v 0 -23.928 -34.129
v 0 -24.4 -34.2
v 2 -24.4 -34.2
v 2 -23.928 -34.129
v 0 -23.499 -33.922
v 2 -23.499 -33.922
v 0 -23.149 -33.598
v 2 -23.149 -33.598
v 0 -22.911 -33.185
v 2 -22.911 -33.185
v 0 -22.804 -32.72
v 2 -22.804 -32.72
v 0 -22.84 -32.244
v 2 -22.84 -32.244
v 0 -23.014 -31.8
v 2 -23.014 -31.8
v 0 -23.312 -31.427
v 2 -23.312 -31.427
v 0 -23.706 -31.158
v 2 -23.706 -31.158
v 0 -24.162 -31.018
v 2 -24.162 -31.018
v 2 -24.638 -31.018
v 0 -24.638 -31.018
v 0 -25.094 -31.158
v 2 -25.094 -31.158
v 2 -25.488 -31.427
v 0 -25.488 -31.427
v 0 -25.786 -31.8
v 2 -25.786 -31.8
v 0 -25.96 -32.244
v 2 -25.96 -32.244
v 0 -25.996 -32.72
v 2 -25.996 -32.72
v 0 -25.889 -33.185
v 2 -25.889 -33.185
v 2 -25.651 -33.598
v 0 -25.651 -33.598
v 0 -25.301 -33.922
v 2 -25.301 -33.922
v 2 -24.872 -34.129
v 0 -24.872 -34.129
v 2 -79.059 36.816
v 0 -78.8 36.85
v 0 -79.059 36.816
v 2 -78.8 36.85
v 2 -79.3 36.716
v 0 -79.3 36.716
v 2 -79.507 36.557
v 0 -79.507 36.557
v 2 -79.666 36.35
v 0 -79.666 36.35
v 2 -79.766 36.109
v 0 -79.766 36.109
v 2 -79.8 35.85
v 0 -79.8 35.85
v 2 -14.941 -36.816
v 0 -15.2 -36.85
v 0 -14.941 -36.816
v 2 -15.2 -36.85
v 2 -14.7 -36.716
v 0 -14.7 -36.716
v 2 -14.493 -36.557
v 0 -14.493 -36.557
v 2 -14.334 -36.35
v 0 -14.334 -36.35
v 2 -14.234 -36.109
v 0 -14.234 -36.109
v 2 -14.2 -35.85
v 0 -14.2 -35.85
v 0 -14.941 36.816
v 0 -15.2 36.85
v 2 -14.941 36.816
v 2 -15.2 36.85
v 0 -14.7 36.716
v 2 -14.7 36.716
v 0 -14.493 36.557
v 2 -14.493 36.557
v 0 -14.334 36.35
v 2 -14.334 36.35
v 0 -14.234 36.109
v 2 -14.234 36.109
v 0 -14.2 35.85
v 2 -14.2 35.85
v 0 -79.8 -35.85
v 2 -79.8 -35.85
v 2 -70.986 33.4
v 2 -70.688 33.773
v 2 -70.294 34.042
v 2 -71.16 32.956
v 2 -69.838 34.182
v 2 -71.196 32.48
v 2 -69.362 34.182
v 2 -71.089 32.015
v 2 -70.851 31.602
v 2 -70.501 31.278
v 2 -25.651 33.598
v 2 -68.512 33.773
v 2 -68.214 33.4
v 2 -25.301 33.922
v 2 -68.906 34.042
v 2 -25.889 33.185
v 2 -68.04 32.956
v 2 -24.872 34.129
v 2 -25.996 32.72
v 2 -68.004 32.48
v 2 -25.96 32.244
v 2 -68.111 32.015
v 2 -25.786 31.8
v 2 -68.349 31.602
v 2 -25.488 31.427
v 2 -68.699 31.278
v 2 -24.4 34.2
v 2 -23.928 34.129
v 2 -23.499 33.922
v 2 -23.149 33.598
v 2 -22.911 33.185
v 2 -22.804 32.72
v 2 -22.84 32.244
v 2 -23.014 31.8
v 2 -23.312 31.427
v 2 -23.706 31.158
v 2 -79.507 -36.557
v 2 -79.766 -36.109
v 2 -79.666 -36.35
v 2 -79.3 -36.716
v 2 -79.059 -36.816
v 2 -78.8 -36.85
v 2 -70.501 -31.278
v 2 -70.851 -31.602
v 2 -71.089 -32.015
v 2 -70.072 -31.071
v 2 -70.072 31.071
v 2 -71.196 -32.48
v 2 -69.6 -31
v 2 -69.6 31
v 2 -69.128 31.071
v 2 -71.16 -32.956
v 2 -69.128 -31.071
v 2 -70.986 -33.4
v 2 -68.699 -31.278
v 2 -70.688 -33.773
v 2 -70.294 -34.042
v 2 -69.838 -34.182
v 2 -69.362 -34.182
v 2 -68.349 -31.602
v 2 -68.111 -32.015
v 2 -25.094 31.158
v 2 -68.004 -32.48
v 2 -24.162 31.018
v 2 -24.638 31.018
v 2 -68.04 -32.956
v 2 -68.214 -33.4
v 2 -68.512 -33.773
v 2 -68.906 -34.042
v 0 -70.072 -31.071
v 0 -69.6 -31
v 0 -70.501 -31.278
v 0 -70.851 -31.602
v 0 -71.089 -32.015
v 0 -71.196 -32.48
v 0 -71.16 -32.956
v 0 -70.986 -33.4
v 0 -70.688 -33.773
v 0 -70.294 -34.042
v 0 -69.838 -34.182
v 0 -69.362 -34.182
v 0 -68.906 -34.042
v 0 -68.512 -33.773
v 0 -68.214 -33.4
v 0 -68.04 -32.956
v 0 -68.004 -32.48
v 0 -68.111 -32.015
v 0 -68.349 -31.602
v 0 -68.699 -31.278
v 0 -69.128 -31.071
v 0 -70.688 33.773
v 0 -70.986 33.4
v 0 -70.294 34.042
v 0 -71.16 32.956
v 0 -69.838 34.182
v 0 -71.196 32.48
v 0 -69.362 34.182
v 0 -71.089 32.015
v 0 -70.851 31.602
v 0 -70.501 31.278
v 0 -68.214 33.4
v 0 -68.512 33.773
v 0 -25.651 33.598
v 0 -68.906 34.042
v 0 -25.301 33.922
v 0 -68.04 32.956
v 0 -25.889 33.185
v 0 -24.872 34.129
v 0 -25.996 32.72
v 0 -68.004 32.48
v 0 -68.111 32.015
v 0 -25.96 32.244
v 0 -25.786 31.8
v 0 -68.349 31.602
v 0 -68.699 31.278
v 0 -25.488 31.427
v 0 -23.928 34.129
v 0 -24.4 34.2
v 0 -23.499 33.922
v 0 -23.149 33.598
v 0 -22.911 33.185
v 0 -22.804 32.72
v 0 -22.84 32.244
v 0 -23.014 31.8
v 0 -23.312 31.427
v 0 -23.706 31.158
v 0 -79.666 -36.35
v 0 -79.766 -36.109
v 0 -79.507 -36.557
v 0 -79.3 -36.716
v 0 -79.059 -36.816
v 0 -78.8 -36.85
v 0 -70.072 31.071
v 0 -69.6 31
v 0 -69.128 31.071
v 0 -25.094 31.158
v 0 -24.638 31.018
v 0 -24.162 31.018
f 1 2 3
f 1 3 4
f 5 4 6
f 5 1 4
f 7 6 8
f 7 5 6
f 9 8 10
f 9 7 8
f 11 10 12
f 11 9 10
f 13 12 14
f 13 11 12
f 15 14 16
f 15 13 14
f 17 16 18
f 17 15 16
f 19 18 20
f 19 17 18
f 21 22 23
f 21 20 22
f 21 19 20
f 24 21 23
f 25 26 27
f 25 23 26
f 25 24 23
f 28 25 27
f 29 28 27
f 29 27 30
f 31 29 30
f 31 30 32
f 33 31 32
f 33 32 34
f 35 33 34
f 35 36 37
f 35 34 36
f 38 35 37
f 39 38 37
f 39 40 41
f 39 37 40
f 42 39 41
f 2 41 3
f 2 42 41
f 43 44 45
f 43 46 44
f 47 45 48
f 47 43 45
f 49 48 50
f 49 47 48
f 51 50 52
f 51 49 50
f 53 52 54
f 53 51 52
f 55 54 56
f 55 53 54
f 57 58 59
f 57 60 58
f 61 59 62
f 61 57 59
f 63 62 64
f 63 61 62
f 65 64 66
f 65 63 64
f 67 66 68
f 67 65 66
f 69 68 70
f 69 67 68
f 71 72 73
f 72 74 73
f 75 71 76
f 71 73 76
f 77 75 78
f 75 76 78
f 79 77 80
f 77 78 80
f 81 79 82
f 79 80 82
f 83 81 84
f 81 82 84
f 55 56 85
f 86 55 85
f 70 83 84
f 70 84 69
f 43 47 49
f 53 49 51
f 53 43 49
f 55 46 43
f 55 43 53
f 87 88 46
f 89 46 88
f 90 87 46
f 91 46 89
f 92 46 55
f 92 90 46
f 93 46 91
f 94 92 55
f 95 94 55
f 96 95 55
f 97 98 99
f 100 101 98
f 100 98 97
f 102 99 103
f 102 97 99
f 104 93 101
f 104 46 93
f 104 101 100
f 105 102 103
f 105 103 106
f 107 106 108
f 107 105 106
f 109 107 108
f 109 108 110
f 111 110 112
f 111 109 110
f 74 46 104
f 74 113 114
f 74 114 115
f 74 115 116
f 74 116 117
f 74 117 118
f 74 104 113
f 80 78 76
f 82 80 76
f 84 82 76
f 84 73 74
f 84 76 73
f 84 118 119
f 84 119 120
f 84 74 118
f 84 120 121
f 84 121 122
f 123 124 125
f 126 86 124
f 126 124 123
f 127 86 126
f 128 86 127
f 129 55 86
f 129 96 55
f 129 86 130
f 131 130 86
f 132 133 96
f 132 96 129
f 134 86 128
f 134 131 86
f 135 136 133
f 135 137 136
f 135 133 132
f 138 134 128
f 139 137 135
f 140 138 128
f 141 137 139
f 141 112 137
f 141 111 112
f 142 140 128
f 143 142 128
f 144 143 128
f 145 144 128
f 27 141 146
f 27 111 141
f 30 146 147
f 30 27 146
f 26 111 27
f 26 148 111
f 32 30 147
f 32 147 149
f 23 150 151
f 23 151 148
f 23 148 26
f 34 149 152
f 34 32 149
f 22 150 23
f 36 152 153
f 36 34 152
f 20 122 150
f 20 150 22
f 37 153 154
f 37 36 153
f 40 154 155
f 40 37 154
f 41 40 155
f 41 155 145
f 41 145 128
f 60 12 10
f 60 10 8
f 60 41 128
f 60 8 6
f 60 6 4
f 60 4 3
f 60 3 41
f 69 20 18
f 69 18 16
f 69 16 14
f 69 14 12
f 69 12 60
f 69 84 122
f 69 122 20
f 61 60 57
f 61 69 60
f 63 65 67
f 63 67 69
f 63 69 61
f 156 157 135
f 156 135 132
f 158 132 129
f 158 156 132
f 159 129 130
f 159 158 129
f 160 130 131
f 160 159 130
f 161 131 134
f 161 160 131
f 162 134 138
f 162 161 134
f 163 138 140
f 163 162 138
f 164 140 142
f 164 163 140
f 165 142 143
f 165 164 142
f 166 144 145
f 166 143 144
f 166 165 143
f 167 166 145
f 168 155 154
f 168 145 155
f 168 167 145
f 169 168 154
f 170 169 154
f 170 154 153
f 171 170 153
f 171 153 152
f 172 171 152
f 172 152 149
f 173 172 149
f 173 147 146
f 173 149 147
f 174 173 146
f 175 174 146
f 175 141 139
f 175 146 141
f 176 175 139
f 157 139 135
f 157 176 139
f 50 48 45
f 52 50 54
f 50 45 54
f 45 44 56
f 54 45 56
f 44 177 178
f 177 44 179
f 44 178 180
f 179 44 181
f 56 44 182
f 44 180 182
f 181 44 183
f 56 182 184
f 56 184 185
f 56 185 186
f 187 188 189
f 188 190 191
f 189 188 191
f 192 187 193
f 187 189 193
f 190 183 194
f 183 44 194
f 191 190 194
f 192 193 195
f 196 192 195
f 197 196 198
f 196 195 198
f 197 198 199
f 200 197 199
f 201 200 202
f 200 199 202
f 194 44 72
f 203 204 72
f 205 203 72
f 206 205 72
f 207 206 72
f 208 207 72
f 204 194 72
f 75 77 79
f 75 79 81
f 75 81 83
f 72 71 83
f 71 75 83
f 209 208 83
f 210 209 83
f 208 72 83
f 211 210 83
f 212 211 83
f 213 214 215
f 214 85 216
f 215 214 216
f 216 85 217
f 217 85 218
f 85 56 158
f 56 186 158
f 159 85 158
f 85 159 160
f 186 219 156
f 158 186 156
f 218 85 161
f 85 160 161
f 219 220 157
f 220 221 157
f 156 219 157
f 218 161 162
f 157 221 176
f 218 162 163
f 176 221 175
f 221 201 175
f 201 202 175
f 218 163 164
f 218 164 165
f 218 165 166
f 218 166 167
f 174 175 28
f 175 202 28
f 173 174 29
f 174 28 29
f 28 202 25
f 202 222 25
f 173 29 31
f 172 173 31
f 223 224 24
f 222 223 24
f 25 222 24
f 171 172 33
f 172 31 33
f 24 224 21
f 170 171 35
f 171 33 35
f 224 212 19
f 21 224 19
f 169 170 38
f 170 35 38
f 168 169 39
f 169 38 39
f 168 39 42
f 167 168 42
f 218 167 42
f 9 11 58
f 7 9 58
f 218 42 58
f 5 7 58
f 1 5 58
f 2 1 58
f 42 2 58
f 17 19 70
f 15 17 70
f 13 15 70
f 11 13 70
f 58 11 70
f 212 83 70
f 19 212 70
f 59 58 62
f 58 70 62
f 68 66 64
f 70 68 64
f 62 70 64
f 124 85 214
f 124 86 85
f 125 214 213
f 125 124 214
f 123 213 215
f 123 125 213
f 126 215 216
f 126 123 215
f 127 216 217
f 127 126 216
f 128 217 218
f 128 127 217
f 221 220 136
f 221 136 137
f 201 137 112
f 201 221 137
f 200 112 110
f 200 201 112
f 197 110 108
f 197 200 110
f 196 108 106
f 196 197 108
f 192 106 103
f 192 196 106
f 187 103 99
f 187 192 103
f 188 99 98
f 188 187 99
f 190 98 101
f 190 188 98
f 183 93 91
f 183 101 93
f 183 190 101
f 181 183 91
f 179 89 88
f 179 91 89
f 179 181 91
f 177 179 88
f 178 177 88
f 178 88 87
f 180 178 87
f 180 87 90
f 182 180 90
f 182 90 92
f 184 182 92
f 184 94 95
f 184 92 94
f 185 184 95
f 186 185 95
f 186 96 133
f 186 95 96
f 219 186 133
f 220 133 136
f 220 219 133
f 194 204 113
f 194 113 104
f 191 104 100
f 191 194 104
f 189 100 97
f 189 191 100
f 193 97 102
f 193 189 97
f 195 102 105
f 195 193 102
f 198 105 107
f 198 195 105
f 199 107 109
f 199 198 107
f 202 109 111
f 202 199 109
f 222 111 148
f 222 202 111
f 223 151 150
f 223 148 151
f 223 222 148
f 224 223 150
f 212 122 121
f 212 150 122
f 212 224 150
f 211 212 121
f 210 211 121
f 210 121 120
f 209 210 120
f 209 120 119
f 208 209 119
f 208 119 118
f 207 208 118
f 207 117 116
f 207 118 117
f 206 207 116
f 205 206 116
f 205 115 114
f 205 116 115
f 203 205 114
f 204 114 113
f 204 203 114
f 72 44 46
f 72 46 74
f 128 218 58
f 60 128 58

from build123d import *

# Parameters (mm, degrees)
SKETCH1_W               = 73.7
SKETCH1_H               = 65.6
BOSS_EXTRUDE1_DEPTH     = 2
FILLET1_R               = 1
CUT_EXTRUDE1_DEPTH      = 88.9202053
CUT_EXTRUDE1_DEPTH_BACK = 88.9202053
SKETCH2_R               = 1.6


with BuildPart() as part:
    # Sketch1 → Boss-Extrude1 (new body)
    with BuildSketch(Plane(origin=(0, 0, 0), x_dir=(0, 0, -1), z_dir=(1, 0, 0))):
        with Locations((0, -47)):
            Rectangle(SKETCH1_W, SKETCH1_H)
    extrude(amount=BOSS_EXTRUDE1_DEPTH)

    # Fillet1
    fillet1_edges = [part.edges().sort_by_distance(p)[0] for p in [
        (1, -14.2, 36.85),
        (1, -14.2, -36.85),
        (1, -79.8, -36.85),
        (1, -79.8, 36.85),
    ]]
    fillet(fillet1_edges, radius=FILLET1_R)

    # Sketch2 → Cut-Extrude1 (cut, two sides: drawn at the far end of the back side and taken through both)
    with BuildSketch(Plane(origin=(0, 0, 0), x_dir=(0, 0, -1), z_dir=(1, 0, 0)).offset(-CUT_EXTRUDE1_DEPTH_BACK)):
        with Locations((-32.6, -69.6)):
            Circle(SKETCH2_R)
        with Locations(Location((32.6, -69.6, 0), (0, 0, 180))):
            Circle(SKETCH2_R)
        with Locations((32.6, -24.4)):
            Circle(SKETCH2_R)
        with Locations(Location((-32.6, -24.4, 0), (0, 0, 180))):
            Circle(SKETCH2_R)
    extrude(amount=CUT_EXTRUDE1_DEPTH + CUT_EXTRUDE1_DEPTH_BACK, mode=Mode.SUBTRACT)


solid = part.part
